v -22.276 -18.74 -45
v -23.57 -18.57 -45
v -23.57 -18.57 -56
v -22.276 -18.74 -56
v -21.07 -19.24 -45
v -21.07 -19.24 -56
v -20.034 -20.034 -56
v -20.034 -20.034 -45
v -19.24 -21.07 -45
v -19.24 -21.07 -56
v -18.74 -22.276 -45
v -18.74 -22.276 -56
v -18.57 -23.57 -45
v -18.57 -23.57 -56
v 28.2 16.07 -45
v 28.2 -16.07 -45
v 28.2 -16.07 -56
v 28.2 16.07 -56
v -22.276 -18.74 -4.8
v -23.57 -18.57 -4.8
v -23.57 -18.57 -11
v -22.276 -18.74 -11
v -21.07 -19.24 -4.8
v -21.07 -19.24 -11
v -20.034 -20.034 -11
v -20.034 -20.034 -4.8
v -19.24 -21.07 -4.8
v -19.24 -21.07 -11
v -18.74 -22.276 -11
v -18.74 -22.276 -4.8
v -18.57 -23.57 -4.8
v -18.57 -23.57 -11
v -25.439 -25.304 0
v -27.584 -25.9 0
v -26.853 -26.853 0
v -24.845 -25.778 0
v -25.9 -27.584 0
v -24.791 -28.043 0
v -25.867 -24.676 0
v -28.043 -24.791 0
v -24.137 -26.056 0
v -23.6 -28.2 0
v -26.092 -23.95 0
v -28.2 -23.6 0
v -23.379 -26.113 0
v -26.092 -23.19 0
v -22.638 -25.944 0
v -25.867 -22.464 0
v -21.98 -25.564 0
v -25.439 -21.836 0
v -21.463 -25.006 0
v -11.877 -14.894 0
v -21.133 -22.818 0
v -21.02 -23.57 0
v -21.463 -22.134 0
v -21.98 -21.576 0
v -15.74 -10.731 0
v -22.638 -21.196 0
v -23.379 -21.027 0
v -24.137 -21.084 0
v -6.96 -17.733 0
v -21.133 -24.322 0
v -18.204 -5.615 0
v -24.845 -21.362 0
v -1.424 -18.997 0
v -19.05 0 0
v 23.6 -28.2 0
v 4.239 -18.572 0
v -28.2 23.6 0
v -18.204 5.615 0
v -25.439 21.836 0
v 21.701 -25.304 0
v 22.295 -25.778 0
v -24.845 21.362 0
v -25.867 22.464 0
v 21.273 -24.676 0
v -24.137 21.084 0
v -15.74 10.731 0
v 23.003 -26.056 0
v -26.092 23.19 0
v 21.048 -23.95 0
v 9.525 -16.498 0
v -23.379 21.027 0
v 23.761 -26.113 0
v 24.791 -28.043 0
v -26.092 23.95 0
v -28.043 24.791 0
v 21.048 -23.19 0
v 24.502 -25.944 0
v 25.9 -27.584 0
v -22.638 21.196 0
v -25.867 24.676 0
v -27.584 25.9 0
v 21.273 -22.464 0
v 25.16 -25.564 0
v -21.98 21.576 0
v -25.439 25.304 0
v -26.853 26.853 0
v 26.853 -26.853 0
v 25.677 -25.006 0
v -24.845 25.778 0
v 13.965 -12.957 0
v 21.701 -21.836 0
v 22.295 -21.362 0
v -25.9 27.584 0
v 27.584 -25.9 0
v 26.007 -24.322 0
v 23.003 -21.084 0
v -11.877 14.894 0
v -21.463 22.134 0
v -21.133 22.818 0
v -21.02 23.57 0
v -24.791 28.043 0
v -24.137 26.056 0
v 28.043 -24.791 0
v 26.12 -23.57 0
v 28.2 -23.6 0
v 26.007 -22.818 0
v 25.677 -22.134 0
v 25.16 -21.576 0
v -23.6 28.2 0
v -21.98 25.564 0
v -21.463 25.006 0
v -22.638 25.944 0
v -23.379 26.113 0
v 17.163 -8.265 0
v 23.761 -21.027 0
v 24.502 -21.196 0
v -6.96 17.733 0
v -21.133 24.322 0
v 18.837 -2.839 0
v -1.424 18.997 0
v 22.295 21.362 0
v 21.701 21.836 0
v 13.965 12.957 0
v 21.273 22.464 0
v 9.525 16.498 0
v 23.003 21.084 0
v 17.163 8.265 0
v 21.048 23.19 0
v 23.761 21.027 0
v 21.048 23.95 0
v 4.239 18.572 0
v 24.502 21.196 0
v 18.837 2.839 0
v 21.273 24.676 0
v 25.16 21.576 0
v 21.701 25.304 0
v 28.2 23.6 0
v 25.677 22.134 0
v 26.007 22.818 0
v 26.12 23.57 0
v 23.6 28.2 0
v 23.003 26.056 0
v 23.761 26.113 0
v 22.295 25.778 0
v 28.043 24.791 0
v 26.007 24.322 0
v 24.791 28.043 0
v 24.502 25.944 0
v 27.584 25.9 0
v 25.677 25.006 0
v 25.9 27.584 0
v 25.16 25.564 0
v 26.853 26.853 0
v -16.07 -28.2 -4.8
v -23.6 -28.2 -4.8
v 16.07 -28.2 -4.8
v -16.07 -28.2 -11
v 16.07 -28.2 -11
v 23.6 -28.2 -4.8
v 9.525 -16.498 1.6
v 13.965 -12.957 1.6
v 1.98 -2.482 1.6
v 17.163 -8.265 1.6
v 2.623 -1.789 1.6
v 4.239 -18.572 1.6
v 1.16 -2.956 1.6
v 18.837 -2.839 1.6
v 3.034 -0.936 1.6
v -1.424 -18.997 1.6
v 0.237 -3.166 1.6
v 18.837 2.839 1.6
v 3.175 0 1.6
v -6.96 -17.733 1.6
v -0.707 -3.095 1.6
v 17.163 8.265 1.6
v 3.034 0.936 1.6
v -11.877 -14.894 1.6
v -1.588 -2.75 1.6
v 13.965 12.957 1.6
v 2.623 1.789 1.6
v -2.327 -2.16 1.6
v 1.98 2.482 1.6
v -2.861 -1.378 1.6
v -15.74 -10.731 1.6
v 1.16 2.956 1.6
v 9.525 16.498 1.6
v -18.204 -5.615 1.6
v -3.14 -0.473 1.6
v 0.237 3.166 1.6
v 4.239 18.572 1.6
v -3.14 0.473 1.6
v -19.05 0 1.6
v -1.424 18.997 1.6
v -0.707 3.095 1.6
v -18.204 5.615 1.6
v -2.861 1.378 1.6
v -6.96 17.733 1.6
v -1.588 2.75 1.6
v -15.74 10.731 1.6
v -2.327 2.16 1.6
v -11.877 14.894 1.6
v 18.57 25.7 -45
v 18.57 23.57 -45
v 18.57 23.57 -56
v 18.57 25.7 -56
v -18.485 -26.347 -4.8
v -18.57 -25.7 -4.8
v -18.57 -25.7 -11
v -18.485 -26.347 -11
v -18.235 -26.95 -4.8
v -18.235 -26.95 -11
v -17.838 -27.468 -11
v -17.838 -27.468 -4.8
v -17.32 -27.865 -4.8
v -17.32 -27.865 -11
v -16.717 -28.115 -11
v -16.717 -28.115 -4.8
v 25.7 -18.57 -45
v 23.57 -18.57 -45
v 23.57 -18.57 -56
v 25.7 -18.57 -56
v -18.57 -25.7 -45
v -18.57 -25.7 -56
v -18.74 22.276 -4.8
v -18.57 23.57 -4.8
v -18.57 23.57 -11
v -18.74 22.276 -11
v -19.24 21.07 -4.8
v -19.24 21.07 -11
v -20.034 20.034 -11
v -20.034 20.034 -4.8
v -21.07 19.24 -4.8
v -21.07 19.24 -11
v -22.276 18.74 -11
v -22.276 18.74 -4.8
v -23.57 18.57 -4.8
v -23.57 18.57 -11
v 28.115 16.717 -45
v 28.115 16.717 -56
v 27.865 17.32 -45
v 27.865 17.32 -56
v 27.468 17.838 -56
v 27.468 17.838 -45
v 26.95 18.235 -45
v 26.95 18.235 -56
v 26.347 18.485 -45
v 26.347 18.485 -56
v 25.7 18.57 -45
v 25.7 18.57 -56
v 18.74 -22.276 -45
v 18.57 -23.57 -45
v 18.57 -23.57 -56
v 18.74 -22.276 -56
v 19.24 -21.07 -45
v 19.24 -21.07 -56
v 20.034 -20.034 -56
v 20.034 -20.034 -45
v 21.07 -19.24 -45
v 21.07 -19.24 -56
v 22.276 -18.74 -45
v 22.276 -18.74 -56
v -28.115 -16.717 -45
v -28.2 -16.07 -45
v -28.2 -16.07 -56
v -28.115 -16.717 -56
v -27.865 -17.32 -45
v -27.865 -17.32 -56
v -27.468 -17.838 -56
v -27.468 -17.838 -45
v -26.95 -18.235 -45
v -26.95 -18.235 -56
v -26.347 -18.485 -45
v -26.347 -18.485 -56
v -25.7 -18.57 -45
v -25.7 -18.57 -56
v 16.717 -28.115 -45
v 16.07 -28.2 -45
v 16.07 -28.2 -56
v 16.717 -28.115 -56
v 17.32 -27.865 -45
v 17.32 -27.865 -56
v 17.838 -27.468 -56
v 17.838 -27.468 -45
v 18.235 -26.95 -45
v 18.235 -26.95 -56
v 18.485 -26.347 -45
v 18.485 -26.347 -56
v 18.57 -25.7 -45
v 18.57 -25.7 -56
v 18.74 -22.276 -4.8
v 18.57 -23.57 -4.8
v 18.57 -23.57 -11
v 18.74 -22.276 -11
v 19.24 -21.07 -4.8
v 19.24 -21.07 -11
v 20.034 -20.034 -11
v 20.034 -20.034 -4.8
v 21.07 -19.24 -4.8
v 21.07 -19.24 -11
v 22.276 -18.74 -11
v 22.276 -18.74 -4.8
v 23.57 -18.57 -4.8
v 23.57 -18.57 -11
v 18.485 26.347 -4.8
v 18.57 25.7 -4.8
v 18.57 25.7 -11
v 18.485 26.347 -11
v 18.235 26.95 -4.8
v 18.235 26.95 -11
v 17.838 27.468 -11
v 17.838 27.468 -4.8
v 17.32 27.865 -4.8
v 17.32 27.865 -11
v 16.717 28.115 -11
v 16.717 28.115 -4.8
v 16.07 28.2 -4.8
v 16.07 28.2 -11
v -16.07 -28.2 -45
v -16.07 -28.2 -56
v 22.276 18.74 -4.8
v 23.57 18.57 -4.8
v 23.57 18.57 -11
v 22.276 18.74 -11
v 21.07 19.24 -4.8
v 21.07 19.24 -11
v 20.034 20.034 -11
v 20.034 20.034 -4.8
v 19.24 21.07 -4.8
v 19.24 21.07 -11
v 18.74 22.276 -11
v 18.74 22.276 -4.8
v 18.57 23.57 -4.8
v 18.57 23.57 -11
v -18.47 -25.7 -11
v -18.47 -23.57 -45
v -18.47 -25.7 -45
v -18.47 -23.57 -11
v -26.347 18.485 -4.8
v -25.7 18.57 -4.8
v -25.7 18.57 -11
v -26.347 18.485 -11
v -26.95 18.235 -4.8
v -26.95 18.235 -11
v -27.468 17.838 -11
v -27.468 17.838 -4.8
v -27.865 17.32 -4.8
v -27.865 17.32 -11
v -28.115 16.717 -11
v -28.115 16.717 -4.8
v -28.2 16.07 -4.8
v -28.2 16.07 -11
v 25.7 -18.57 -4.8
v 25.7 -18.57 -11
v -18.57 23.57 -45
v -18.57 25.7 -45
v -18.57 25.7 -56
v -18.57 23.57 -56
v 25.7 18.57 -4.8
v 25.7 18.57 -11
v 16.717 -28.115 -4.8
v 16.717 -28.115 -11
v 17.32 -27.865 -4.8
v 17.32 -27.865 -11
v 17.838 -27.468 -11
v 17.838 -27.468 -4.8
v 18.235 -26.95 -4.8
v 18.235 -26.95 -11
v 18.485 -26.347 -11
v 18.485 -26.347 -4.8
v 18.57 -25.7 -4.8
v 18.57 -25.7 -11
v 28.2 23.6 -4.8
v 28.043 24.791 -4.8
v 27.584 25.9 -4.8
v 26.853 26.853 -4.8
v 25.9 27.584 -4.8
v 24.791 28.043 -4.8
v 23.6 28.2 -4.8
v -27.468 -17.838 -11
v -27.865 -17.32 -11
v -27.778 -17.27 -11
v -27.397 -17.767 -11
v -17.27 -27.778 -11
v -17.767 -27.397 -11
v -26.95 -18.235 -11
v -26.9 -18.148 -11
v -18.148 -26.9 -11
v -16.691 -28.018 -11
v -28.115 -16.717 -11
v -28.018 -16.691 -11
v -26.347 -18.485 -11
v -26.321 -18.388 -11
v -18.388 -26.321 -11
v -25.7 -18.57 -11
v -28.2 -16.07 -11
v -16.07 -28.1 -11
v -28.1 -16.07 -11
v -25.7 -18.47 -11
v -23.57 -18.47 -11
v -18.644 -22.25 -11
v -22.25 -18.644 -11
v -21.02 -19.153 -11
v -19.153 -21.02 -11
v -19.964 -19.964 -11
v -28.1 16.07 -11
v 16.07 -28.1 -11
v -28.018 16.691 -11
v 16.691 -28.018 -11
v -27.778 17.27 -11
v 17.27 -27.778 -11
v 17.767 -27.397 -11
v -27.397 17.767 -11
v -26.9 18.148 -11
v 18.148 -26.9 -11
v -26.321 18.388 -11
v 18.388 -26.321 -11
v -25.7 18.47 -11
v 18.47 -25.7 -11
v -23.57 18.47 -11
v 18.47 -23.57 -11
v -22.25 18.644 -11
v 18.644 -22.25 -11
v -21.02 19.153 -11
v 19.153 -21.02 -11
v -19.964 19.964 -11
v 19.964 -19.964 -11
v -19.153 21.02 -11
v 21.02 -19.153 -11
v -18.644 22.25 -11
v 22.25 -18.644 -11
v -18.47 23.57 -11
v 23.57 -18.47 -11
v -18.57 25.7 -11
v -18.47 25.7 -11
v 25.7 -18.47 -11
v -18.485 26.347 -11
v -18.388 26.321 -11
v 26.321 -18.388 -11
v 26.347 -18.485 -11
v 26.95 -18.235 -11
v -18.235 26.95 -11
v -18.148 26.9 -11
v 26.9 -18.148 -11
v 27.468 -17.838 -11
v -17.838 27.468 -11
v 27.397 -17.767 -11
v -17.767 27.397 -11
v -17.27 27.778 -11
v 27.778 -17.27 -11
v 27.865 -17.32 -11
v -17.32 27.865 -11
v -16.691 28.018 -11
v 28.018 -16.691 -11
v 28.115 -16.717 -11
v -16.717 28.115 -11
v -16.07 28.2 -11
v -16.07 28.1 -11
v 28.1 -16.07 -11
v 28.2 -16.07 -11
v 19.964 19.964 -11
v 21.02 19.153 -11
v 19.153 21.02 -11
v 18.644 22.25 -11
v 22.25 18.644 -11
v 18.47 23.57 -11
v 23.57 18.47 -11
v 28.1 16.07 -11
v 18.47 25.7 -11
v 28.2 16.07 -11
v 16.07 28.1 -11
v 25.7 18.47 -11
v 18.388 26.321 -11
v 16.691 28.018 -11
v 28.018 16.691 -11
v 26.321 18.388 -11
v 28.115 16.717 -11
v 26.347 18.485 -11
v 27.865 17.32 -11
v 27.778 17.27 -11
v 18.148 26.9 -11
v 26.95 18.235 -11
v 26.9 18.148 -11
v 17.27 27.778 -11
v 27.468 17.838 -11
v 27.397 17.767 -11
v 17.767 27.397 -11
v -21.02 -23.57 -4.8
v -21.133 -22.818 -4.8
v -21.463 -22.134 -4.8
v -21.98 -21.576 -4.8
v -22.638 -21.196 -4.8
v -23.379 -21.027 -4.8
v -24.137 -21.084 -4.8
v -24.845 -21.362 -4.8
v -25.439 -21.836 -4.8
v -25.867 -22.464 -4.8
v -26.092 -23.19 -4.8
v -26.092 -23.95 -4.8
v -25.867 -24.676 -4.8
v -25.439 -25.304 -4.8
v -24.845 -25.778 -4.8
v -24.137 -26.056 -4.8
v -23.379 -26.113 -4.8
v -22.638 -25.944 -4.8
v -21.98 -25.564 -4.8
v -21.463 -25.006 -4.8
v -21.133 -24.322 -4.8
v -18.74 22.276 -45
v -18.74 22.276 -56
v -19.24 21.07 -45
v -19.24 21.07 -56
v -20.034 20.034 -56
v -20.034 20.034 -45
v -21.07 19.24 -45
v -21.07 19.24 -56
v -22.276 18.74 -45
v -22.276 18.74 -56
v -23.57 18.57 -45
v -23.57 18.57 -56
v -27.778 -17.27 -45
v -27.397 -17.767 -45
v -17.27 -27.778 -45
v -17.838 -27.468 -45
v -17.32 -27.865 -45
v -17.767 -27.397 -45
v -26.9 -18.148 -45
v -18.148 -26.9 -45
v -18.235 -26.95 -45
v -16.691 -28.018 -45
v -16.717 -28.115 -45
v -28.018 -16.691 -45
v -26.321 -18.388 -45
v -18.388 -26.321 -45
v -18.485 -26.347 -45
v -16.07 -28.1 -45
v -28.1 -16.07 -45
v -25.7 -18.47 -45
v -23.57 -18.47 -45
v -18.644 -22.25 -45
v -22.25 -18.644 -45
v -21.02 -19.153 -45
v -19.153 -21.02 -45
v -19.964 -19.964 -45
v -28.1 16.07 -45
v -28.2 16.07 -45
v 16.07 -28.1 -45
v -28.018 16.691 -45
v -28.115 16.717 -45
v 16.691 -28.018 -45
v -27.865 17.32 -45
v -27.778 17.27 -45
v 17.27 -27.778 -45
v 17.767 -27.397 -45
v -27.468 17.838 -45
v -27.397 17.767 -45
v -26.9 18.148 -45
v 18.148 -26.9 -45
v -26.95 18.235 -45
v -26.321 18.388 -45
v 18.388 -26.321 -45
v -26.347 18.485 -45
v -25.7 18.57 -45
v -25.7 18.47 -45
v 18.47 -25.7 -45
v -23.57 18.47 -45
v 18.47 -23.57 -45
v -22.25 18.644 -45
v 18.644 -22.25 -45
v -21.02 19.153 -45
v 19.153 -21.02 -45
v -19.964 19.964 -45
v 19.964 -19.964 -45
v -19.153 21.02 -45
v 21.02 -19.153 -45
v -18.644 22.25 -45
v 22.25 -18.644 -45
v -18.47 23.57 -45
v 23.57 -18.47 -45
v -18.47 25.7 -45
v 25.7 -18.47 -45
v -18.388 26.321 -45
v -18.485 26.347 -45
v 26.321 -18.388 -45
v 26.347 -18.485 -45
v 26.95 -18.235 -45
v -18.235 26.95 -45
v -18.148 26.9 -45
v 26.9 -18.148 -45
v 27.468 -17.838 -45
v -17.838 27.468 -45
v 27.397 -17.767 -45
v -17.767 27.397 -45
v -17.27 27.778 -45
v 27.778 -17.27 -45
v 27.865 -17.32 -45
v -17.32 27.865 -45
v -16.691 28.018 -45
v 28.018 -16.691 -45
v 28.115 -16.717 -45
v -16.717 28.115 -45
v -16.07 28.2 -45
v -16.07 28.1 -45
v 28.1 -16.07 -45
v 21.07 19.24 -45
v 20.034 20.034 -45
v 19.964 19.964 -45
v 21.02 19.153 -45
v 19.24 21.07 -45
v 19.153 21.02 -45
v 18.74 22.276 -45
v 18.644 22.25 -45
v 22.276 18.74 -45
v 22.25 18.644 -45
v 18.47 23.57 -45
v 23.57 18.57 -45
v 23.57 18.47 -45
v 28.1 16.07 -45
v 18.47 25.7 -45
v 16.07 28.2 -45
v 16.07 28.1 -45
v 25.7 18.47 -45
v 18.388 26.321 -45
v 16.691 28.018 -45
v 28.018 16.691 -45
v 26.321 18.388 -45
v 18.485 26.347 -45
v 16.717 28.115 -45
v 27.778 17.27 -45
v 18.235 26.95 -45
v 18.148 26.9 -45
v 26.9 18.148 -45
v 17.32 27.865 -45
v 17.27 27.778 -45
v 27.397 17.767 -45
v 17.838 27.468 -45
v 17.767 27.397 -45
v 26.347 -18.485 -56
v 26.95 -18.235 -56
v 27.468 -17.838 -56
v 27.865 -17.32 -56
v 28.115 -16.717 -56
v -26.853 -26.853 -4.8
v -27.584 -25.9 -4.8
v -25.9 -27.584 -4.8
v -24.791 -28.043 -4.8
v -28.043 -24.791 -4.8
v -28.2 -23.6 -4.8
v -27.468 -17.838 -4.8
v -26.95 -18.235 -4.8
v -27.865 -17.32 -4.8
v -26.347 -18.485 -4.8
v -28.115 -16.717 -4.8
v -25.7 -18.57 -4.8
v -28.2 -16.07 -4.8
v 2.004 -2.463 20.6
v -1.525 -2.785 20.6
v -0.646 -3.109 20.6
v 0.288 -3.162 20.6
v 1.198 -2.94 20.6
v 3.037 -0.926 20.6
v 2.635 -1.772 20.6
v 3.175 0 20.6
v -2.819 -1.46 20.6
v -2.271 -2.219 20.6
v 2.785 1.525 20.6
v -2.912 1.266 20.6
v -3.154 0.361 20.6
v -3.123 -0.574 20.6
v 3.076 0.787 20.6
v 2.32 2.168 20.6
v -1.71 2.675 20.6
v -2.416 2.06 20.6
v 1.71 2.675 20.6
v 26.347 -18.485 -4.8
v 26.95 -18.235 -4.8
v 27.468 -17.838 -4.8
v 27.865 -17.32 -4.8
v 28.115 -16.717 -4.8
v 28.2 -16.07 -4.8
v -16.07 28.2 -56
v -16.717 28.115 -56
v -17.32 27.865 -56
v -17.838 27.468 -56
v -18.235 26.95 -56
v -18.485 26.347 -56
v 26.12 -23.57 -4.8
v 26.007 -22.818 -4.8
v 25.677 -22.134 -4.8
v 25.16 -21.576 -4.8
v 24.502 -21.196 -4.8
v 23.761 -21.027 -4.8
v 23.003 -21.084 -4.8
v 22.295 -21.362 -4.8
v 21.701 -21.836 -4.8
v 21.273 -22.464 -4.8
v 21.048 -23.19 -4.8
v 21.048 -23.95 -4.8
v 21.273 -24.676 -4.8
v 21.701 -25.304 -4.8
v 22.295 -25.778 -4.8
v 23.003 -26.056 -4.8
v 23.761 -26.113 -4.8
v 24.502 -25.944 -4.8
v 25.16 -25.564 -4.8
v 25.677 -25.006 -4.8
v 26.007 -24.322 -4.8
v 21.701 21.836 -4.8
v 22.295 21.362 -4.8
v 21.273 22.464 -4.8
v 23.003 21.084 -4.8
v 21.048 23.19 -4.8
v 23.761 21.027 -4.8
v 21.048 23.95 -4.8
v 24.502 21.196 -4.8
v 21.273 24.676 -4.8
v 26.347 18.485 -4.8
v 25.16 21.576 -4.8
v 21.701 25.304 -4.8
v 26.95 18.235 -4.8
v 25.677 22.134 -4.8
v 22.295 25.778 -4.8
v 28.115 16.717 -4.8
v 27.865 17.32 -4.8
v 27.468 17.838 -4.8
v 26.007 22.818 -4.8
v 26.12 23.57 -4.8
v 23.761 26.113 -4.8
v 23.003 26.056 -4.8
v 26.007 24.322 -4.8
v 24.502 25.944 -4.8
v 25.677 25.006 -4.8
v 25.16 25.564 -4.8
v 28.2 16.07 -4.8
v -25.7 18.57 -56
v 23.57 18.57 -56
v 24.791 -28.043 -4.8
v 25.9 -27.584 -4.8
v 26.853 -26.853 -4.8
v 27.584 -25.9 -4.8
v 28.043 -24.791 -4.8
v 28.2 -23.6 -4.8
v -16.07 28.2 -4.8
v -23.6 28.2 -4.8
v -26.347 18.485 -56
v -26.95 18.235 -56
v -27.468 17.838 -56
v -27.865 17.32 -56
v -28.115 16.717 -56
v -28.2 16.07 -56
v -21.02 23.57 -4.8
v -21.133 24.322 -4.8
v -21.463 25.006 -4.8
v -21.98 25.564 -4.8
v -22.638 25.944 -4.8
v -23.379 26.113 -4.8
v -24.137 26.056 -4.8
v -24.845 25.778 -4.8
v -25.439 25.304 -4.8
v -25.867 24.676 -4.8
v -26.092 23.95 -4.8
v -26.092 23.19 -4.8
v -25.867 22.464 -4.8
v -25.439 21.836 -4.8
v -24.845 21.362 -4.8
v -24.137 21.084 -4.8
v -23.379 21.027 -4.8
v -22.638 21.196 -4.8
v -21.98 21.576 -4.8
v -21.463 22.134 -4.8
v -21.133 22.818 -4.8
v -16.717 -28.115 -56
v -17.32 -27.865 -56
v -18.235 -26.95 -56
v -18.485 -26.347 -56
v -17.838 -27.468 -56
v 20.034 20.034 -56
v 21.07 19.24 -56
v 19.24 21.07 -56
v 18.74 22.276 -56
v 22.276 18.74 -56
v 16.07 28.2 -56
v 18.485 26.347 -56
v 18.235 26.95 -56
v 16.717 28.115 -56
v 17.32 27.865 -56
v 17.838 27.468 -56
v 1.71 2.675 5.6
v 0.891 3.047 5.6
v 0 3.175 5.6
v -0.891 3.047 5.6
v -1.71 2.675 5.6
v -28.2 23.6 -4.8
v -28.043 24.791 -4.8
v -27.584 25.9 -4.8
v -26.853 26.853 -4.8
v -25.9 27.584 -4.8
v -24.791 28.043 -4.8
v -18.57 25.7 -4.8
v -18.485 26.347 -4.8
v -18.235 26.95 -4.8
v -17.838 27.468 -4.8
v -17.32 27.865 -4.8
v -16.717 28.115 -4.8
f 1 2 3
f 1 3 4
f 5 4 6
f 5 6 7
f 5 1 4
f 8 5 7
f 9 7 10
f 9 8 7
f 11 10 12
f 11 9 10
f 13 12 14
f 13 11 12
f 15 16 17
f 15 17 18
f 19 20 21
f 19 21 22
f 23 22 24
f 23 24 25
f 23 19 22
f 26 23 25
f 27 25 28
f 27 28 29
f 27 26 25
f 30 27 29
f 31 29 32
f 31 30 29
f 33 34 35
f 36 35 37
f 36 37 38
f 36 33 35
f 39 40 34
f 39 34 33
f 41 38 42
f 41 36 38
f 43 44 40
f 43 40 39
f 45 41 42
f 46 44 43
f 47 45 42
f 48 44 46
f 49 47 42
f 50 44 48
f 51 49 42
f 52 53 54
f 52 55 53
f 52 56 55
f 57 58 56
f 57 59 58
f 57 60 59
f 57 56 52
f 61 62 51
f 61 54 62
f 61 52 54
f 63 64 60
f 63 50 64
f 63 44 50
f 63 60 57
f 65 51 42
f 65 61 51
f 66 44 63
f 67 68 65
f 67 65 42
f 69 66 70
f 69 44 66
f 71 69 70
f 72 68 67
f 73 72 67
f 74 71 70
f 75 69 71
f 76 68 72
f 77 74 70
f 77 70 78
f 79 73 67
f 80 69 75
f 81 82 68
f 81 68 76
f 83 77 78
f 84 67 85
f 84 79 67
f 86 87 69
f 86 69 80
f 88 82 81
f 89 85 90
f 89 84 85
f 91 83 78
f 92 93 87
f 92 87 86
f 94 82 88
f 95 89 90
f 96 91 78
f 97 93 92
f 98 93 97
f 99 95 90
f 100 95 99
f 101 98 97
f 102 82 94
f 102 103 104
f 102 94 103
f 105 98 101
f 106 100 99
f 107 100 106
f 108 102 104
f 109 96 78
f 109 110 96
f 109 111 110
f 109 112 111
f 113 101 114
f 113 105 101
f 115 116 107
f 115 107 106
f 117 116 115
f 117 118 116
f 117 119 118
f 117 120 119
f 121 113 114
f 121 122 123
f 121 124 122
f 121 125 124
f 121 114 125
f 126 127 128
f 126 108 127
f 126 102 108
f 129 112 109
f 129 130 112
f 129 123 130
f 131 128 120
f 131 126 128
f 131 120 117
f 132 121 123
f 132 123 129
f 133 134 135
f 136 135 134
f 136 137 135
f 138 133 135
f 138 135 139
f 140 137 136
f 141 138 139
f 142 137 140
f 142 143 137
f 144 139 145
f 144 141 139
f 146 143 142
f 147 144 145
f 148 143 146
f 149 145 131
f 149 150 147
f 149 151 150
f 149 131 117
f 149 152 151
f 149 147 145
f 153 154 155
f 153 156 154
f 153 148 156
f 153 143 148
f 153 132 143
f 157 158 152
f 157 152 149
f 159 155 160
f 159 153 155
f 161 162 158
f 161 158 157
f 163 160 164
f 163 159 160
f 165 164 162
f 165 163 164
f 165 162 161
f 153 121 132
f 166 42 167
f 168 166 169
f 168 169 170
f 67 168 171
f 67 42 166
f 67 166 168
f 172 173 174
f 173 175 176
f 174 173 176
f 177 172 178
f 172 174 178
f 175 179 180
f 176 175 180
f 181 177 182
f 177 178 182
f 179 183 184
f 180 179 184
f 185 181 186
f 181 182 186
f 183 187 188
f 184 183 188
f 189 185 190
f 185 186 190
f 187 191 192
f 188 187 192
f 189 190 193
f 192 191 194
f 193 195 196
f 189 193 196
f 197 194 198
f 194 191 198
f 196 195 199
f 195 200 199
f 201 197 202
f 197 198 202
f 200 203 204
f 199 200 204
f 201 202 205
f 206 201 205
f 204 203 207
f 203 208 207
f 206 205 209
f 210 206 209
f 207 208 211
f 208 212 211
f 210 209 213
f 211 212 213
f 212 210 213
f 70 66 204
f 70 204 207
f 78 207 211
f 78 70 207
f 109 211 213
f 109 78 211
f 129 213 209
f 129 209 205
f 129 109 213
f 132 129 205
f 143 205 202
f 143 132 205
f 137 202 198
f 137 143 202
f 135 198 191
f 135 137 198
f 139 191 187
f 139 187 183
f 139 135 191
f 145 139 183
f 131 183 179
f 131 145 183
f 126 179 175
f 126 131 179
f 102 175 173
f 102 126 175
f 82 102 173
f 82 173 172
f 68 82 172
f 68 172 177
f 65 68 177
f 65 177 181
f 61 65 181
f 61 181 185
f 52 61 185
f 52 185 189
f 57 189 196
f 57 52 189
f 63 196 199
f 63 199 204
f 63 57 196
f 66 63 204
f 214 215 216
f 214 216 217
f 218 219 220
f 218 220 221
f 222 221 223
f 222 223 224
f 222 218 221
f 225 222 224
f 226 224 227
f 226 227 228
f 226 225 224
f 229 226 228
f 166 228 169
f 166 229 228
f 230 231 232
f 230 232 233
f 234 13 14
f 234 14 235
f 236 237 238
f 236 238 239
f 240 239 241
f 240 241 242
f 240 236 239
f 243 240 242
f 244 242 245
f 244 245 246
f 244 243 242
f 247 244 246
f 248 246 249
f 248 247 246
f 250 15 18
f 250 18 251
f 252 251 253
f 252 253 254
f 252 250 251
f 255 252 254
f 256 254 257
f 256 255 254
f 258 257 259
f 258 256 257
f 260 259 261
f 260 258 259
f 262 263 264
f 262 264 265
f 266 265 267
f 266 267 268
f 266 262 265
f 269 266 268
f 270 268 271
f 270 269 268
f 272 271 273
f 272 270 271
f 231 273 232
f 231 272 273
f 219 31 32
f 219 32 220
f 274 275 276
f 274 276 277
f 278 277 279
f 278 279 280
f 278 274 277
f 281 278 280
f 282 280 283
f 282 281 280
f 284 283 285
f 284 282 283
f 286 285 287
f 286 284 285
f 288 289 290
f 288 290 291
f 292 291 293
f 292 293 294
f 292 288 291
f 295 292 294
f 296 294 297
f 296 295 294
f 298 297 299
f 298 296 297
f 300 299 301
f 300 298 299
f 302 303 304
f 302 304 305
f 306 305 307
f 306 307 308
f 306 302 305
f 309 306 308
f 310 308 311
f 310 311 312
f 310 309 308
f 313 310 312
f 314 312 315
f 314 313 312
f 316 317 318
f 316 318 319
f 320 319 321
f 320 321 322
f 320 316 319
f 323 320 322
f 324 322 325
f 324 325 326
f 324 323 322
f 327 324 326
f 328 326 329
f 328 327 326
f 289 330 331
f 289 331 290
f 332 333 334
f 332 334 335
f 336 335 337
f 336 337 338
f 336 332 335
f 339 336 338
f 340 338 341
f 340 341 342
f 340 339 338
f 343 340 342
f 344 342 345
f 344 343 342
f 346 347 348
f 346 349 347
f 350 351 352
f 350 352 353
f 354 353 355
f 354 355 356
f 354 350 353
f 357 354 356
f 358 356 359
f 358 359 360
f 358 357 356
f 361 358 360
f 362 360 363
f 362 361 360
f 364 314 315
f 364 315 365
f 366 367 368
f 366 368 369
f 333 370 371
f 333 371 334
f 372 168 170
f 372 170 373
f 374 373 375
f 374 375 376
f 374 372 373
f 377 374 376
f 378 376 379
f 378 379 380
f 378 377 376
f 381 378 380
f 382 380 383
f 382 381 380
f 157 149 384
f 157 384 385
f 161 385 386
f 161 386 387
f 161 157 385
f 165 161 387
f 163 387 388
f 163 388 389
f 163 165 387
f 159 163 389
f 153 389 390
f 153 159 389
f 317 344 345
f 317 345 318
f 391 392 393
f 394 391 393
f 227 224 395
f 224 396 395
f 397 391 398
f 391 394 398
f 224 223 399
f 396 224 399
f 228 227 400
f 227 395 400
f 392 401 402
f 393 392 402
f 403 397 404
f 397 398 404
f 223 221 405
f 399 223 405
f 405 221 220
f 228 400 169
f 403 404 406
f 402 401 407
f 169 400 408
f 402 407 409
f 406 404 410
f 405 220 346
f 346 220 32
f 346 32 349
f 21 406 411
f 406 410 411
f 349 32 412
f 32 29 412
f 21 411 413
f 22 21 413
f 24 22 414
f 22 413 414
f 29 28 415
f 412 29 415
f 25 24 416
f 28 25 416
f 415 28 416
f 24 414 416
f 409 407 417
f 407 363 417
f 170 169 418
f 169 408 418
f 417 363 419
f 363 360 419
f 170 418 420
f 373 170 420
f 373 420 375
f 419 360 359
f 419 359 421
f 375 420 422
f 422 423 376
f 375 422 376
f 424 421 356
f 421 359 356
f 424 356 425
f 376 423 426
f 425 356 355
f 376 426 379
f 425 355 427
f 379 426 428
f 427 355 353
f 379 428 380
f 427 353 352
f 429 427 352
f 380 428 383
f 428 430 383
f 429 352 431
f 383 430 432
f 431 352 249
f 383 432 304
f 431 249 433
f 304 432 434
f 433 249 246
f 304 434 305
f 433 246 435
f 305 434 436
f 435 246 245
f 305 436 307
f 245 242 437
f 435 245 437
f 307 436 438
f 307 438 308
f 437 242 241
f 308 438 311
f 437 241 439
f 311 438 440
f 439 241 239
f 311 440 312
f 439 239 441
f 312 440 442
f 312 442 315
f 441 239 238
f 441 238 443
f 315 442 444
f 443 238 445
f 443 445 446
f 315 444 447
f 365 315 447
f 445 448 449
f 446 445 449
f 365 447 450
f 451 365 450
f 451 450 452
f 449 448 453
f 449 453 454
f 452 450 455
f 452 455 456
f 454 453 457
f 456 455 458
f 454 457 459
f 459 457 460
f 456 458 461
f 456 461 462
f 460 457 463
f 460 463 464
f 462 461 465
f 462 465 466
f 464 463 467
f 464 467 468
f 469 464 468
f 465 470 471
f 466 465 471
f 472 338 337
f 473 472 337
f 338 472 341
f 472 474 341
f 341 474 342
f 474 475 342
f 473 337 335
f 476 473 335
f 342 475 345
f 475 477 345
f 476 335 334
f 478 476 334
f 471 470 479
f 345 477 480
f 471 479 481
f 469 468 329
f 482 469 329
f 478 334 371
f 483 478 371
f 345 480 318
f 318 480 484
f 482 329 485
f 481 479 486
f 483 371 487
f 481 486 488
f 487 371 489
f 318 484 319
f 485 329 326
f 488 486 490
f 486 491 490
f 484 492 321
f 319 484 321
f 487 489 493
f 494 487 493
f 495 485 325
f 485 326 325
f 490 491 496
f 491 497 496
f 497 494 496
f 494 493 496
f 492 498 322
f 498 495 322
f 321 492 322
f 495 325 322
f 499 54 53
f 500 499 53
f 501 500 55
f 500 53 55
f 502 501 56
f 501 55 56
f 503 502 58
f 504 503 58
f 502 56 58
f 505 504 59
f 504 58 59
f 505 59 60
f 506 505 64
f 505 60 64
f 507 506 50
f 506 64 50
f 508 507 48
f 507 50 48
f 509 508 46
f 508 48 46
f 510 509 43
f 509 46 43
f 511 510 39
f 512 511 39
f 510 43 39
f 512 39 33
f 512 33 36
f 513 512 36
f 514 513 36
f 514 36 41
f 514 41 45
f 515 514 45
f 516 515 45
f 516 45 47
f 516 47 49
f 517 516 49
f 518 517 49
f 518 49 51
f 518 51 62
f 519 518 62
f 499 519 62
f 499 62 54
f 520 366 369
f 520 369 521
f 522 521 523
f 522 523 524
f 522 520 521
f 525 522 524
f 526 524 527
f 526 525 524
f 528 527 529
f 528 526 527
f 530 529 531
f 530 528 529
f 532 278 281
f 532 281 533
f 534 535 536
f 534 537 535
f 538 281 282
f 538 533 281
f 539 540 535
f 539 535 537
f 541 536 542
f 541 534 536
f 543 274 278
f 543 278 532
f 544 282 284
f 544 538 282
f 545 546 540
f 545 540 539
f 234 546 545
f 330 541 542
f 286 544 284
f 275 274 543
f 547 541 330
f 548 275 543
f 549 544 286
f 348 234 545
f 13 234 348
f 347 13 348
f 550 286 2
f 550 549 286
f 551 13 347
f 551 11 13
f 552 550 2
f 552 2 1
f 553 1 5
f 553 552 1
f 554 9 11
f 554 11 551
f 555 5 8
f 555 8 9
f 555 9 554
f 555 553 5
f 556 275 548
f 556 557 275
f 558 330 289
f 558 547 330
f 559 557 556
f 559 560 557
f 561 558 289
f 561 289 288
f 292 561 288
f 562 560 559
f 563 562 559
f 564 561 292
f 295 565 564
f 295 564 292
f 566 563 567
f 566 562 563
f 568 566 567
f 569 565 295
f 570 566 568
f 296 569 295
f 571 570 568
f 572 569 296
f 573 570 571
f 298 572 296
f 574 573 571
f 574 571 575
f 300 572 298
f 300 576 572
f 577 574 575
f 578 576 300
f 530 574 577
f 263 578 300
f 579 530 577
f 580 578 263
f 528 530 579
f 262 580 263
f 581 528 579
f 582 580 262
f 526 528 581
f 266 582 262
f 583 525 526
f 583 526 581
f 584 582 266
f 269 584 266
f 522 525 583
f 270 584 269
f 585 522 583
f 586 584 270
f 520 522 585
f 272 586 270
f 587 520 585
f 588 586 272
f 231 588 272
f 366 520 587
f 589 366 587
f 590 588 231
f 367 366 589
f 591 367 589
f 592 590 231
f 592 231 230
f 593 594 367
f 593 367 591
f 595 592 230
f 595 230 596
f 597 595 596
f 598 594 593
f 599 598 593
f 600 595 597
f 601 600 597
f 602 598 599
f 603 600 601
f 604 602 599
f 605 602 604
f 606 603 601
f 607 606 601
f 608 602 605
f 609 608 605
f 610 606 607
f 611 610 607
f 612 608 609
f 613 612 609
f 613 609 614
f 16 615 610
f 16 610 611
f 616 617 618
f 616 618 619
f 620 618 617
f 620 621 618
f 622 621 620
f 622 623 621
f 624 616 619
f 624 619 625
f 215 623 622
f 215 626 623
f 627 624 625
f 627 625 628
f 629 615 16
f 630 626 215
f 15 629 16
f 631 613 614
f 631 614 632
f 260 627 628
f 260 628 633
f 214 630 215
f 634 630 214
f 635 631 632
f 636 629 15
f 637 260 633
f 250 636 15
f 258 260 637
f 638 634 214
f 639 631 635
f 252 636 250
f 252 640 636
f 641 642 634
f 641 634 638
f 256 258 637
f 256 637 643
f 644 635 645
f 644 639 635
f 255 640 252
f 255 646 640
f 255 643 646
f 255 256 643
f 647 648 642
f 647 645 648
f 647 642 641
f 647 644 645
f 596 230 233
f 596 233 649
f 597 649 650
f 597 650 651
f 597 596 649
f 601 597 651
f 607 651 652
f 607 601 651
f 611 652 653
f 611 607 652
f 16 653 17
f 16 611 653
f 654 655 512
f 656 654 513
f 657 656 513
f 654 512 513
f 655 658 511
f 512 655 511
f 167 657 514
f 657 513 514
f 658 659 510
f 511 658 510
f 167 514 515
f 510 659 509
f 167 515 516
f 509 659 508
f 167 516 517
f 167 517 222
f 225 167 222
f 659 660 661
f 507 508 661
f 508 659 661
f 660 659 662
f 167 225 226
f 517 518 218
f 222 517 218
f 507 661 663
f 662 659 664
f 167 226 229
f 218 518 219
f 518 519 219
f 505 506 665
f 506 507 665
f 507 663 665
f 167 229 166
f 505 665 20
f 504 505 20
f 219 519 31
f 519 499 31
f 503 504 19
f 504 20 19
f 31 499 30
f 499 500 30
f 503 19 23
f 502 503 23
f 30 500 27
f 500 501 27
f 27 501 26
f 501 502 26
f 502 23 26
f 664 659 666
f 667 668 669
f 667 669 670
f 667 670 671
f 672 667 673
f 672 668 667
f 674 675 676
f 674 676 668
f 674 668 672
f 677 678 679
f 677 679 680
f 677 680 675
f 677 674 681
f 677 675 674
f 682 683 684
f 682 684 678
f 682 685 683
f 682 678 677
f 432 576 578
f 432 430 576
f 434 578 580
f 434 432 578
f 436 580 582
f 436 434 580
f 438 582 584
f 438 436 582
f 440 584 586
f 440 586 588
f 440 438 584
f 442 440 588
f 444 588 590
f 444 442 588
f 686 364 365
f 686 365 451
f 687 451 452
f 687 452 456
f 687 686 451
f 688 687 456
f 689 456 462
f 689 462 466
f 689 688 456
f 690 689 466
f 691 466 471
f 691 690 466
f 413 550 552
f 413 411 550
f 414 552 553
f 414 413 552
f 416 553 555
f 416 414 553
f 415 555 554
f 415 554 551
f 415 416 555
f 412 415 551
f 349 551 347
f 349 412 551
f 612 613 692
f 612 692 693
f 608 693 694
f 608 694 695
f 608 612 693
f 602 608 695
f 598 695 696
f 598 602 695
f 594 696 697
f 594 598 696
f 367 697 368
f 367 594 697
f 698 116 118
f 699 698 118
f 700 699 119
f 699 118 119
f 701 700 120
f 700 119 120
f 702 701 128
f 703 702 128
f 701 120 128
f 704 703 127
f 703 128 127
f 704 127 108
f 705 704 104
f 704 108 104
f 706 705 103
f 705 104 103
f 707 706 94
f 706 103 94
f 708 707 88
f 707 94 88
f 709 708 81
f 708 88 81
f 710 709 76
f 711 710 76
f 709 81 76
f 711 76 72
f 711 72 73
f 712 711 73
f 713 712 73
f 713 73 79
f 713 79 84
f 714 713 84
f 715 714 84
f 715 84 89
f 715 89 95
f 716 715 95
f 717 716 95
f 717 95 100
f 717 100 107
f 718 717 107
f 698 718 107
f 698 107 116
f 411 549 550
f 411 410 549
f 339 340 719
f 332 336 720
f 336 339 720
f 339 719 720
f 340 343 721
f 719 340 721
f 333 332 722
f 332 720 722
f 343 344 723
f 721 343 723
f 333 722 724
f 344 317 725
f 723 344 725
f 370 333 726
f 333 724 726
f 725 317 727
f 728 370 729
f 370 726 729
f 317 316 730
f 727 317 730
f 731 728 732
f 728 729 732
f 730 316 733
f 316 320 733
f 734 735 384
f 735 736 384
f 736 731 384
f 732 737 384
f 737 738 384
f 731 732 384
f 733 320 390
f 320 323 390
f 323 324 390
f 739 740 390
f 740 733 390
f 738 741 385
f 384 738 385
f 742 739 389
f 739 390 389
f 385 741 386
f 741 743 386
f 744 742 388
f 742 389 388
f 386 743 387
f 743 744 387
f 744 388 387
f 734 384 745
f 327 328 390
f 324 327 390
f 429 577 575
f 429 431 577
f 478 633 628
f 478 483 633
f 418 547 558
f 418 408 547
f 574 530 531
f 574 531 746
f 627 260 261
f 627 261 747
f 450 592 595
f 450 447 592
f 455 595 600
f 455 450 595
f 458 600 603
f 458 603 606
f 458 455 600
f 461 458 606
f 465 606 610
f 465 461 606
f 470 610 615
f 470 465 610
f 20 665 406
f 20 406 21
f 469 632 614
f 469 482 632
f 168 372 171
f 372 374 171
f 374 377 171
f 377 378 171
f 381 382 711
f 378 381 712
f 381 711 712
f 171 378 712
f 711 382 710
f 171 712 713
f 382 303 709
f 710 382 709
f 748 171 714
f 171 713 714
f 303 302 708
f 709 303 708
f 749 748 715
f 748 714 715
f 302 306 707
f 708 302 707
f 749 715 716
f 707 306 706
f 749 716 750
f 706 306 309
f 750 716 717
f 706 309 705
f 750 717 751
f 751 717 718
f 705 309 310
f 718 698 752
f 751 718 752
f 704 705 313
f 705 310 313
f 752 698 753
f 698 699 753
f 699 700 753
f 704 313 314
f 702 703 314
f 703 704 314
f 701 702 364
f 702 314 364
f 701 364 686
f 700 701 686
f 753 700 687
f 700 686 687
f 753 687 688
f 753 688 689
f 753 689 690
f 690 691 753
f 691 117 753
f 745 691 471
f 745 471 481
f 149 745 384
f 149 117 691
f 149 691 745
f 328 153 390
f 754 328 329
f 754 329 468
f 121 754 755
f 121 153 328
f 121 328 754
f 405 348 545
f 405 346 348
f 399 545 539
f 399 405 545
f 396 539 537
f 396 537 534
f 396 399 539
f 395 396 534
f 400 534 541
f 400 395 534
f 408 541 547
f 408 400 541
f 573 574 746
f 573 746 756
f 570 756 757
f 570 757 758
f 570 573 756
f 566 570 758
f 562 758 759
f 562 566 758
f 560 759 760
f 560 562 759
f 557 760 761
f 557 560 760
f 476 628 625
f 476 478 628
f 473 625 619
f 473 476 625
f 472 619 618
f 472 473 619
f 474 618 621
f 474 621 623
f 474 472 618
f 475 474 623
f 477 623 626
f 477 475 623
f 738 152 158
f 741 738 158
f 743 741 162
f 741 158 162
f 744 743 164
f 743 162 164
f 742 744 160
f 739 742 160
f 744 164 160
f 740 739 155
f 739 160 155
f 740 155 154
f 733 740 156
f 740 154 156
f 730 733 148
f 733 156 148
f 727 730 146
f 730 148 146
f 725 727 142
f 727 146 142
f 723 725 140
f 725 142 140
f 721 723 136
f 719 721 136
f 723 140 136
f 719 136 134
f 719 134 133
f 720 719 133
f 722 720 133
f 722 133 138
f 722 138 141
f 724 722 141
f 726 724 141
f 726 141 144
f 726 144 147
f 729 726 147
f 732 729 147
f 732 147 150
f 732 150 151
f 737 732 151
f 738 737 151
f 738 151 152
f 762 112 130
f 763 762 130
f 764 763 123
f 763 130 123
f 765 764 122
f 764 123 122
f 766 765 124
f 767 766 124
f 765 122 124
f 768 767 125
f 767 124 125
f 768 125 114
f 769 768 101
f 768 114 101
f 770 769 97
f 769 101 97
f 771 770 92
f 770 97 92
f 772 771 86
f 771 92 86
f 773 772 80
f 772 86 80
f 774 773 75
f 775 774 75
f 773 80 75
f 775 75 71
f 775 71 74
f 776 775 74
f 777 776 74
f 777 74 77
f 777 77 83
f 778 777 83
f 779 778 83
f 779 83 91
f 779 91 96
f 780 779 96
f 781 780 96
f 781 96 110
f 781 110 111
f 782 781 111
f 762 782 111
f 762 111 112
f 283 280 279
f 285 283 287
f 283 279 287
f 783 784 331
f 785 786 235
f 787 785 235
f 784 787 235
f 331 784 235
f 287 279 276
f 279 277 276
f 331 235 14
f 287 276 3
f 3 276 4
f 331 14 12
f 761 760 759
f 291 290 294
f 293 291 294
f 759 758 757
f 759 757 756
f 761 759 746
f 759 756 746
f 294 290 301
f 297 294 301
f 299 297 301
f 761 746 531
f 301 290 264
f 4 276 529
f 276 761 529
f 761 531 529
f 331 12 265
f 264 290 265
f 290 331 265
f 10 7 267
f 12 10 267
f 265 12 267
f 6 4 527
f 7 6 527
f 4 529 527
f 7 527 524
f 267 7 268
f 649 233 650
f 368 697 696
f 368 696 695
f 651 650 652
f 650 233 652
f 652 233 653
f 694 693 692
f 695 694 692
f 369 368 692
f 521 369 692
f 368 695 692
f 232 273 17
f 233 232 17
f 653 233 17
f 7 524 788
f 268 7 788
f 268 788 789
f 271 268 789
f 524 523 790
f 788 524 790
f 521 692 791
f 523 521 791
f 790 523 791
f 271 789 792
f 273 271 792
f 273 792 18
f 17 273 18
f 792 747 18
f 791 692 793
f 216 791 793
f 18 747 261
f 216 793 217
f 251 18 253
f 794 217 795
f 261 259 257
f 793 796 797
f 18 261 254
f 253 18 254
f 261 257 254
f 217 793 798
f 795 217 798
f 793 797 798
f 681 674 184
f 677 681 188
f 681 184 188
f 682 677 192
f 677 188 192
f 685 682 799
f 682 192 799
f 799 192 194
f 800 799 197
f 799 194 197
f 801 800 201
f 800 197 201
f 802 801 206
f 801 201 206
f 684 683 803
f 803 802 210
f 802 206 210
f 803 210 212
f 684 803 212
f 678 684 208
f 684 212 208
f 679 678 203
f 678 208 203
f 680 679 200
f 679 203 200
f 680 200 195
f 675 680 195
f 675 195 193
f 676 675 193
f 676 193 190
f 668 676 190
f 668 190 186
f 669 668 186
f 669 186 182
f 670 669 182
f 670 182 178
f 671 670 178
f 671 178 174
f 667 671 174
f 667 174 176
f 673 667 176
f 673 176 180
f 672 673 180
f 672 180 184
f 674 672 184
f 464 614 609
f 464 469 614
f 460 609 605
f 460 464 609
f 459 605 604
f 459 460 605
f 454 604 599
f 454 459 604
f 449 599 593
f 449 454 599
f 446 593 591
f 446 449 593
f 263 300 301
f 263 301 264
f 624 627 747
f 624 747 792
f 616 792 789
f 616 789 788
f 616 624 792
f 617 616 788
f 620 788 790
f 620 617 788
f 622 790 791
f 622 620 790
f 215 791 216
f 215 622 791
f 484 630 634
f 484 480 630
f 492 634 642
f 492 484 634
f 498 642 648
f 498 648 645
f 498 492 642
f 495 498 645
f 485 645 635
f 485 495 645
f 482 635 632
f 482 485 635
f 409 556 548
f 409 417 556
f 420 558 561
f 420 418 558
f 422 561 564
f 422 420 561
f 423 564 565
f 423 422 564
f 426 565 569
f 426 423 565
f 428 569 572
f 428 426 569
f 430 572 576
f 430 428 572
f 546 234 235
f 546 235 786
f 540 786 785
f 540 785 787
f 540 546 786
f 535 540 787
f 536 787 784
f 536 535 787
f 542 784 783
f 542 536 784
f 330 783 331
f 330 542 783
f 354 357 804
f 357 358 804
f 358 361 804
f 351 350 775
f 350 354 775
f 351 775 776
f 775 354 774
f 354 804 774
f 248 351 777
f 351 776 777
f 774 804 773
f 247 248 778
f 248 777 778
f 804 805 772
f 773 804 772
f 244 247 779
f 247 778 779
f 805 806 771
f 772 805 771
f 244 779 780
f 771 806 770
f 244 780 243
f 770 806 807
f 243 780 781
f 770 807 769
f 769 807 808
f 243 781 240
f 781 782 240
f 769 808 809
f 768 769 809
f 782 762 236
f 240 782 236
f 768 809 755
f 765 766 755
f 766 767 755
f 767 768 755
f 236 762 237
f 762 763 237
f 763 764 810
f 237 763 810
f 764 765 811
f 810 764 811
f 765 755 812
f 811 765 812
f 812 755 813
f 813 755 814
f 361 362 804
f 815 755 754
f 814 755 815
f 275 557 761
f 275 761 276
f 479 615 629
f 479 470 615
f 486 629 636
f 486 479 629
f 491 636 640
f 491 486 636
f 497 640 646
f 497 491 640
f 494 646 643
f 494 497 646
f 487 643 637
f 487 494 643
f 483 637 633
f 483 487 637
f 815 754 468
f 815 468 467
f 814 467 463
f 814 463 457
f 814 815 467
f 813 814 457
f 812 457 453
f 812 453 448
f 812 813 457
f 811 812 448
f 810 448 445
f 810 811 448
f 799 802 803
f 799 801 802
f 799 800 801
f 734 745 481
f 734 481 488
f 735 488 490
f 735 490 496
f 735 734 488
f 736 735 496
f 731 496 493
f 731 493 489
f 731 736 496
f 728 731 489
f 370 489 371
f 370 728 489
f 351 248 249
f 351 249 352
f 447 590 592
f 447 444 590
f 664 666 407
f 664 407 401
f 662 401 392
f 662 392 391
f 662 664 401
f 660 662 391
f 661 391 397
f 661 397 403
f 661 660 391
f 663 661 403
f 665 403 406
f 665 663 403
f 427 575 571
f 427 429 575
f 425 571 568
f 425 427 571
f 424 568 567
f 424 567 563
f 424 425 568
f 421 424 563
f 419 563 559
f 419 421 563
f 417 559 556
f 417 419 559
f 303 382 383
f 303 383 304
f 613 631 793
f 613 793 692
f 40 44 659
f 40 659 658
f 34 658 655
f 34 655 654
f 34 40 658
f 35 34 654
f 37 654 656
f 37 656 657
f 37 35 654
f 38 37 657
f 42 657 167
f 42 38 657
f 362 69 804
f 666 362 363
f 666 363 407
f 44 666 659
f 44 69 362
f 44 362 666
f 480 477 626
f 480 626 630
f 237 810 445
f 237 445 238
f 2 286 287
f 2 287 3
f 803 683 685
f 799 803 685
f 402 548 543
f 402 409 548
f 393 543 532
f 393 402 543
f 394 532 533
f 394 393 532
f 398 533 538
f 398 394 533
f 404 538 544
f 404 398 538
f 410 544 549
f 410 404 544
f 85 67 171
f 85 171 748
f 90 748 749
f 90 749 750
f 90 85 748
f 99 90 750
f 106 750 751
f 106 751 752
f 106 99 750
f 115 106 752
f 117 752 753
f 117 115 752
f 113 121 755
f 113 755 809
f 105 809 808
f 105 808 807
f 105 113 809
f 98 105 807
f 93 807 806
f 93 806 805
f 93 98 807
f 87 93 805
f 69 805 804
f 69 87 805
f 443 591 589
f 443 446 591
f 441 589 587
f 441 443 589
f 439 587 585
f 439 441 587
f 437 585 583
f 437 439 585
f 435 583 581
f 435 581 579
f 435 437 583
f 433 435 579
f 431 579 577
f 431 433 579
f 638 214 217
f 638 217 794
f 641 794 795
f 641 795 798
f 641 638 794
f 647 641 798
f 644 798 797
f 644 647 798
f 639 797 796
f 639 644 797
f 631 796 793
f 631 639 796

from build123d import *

# Parameters (mm, degrees)
SKETCH1_R           = 3.175
BOSS_EXTRUDE1_DEPTH = 20.6
SKETCH2_R           = 19.05
BOSS_EXTRUDE2_DEPTH = 1.6
BOSS_EXTRUDE3_DEPTH = 4.8
BOSS_EXTRUDE4_DEPTH = 51.2
SKETCH7_W           = 3.420526276
SKETCH7_H           = 1.112659396
CUT_EXTRUDE5_DEPTH  = 15
CUT_EXTRUDE6_REACH  = 58
SKETCH8_R           = 2.55
CUT_EXTRUDE7_DEPTH  = 17


with BuildPart() as part:
    # Sketch1 → Boss-Extrude1 (new body)
    with BuildSketch(Plane.XY):
        Circle(SKETCH1_R)
    extrude(amount=BOSS_EXTRUDE1_DEPTH)

    # Sketch2 → Boss-Extrude2 (add)
    with BuildSketch(Plane(origin=(0, 0, 0), x_dir=(-1, 0, 0), z_dir=(0, 0, -1))):
        Circle(SKETCH2_R)
    extrude(amount=-BOSS_EXTRUDE2_DEPTH)

    # Sketch3 → Boss-Extrude3 (add)
    with BuildSketch(Plane(origin=(0, 0, 0), x_dir=(-1, 0, 0), z_dir=(0, 0, -1))):
        with BuildLine():
            Line((23.6, -28.2), (-23.6, -28.2))
            ThreePointArc((-23.6, -28.2), (-26.852691193, -26.852691193), (-28.2, -23.6))
            Line((-28.2, -23.6), (-28.2, 23.6))
            ThreePointArc((-28.2, 23.6), (-26.852691193, 26.852691193), (-23.6, 28.2))
            Line((-23.6, 28.2), (23.6, 28.2))
            ThreePointArc((23.6, 28.2), (26.852691193, 26.852691193), (28.2, 23.6))
            Line((28.2, 23.6), (28.2, -23.6))
            ThreePointArc((28.2, -23.6), (26.852691193, -26.852691193), (23.6, -28.2))
        make_face()
    extrude(amount=BOSS_EXTRUDE3_DEPTH)

    # Sketch4 → Boss-Extrude4 (add)
    with BuildSketch(Plane(origin=(0, 0, -4.8), x_dir=(-1, 0, 0), z_dir=(0, 0, -1))):
        with BuildLine():
            Line((-18.57, 23.57), (-18.57, 25.7))
            ThreePointArc((-18.57, 25.7), (-17.837766953, 27.467766953), (-16.07, 28.2))
            Line((-16.07, 28.2), (16.07, 28.2))
            ThreePointArc((16.07, 28.2), (17.837766953, 27.467766953), (18.57, 25.7))
            Line((18.57, 25.7), (18.57, 23.57))
            ThreePointArc((18.57, 23.57), (20.034466094, 20.034466094), (23.57, 18.57))
            Line((23.57, 18.57), (25.7, 18.57))
            ThreePointArc((25.7, 18.57), (27.467766953, 17.837766953), (28.2, 16.07))
            Line((28.2, 16.07), (28.2, -16.07))
            ThreePointArc((28.2, -16.07), (27.467766953, -17.837766953), (25.7, -18.57))
            Line((25.7, -18.57), (23.57, -18.57))
            ThreePointArc((23.57, -18.57), (20.034466094, -20.034466094), (18.57, -23.57))
            Line((18.57, -23.57), (18.57, -25.7))
            ThreePointArc((18.57, -25.7), (17.837766953, -27.467766953), (16.07, -28.2))
            Line((16.07, -28.2), (-16.07, -28.2))
            ThreePointArc((-16.07, -28.2), (-17.837766953, -27.467766953), (-18.57, -25.7))
            Line((-18.57, -25.7), (-18.57, -23.57))
            ThreePointArc((-18.57, -23.57), (-20.034466094, -20.034466094), (-23.57, -18.57))
            Line((-23.57, -18.57), (-25.7, -18.57))
            ThreePointArc((-25.7, -18.57), (-27.467766953, -17.837766953), (-28.2, -16.07))
            Line((-28.2, -16.07), (-28.2, 16.07))
            ThreePointArc((-28.2, 16.07), (-27.467766953, 17.837766953), (-25.7, 18.57))
            Line((-25.7, 18.57), (-23.57, 18.57))
            ThreePointArc((-23.57, 18.57), (-20.034466094, 20.034466094), (-18.57, 23.57))
        make_face()
    extrude(amount=BOSS_EXTRUDE4_DEPTH)

    # Sketch7 → Cut-Extrude5 (cut)
    with BuildSketch(Plane.XY.offset(20.6)):
        with Locations((0, 3.231329698)):
            Rectangle(SKETCH7_W, SKETCH7_H)
    extrude(amount=-CUT_EXTRUDE5_DEPTH, mode=Mode.SUBTRACT)

    # Sketch8 → Cut-Extrude6 (cut, up to next)
    with BuildSketch(Plane.XY, mode=Mode.PRIVATE) as cut_extrude6_sk1:
        with Locations((-23.57, 23.57)):
            Circle(SKETCH8_R)
    cut_extrude6_tool1 = extrude(cut_extrude6_sk1.sketch, amount=-CUT_EXTRUDE6_REACH, mode=Mode.PRIVATE) & part.part
    add(cut_extrude6_tool1.solids().sort_by_distance((-23.57, 23.57, 0))[0], mode=Mode.SUBTRACT)
    # Sketch8 → Cut-Extrude6 (cut, up to next)
    with BuildSketch(Plane.XY, mode=Mode.PRIVATE) as cut_extrude6_sk2:
        with Locations((23.57, 23.57)):
            Circle(SKETCH8_R)
    cut_extrude6_tool2 = extrude(cut_extrude6_sk2.sketch, amount=-CUT_EXTRUDE6_REACH, mode=Mode.PRIVATE) & part.part
    add(cut_extrude6_tool2.solids().sort_by_distance((23.57, 23.57, 0))[0], mode=Mode.SUBTRACT)
    # Sketch8 → Cut-Extrude6 (cut, up to next)
    with BuildSketch(Plane.XY, mode=Mode.PRIVATE) as cut_extrude6_sk3:
        with Locations((23.57, -23.57)):
            Circle(SKETCH8_R)
    cut_extrude6_tool3 = extrude(cut_extrude6_sk3.sketch, amount=-CUT_EXTRUDE6_REACH, mode=Mode.PRIVATE) & part.part
    add(cut_extrude6_tool3.solids().sort_by_distance((23.57, -23.57, 0))[0], mode=Mode.SUBTRACT)
    # Sketch8 → Cut-Extrude6 (cut, up to next)
    with BuildSketch(Plane.XY, mode=Mode.PRIVATE) as cut_extrude6_sk4:
        with Locations((-23.57, -23.57)):
            Circle(SKETCH8_R)
    cut_extrude6_tool4 = extrude(cut_extrude6_sk4.sketch, amount=-CUT_EXTRUDE6_REACH, mode=Mode.PRIVATE) & part.part
    add(cut_extrude6_tool4.solids().sort_by_distance((-23.57, -23.57, 0))[0], mode=Mode.SUBTRACT)

    # Sketch9 → Cut-Extrude7 (cut, symmetric)
    with BuildSketch(Plane.XY.offset(-28)):
        with BuildLine():
            Line((18.57, 23.57), (18.57, 25.7))
            ThreePointArc((18.57, 25.7), (17.837766953, 27.467766953), (16.07, 28.2))
            Line((16.07, 28.2), (-16.07, 28.2))
            ThreePointArc((-16.07, 28.2), (-17.837766953, 27.467766953), (-18.57, 25.7))
            Line((-18.57, 25.7), (-18.57, 23.57))
            ThreePointArc((-18.57, 23.57), (-20.034466094, 20.034466094), (-23.57, 18.57))
            Line((-23.57, 18.57), (-25.7, 18.57))
            ThreePointArc((-25.7, 18.57), (-27.467766953, 17.837766953), (-28.2, 16.07))
            Line((-28.2, 16.07), (-28.2, -16.07))
            ThreePointArc((-28.2, -16.07), (-27.467766953, -17.837766953), (-25.7, -18.57))
            Line((-25.7, -18.57), (-23.57, -18.57))
            ThreePointArc((-23.57, -18.57), (-20.034466094, -20.034466094), (-18.57, -23.57))
            Line((-18.57, -23.57), (-18.57, -25.7))
            ThreePointArc((-18.57, -25.7), (-17.837766953, -27.467766953), (-16.07, -28.2))
            Line((-16.07, -28.2), (16.07, -28.2))
            ThreePointArc((16.07, -28.2), (17.837766953, -27.467766953), (18.57, -25.7))
            Line((18.57, -25.7), (18.57, -23.57))
            ThreePointArc((18.57, -23.57), (20.034466094, -20.034466094), (23.57, -18.57))
            Line((23.57, -18.57), (25.7, -18.57))
            ThreePointArc((25.7, -18.57), (27.467766953, -17.837766953), (28.2, -16.07))
            Line((28.2, -16.07), (28.2, 16.07))
            ThreePointArc((28.2, 16.07), (27.467766953, 17.837766953), (25.7, 18.57))
            Line((25.7, 18.57), (23.57, 18.57))
            ThreePointArc((23.57, 18.57), (20.034466094, 20.034466094), (18.57, 23.57))
        make_face()
        with BuildLine():
            Line((18.47, 23.57), (18.47, 25.7))
            ThreePointArc((18.47, 25.7), (17.767056275, 27.397056275), (16.07, 28.1))
            Line((16.07, 28.1), (-16.07, 28.1))
            ThreePointArc((-16.07, 28.1), (-17.767056275, 27.397056275), (-18.47, 25.7))
            Line((-18.47, 25.7), (-18.47, 23.57))
            ThreePointArc((-18.47, 23.57), (-19.963755416, 19.963755416), (-23.57, 18.47))
            Line((-23.57, 18.47), (-25.7, 18.47))
            ThreePointArc((-25.7, 18.47), (-27.397056275, 17.767056275), (-28.1, 16.07))
            Line((-28.1, 16.07), (-28.1, -16.07))
            ThreePointArc((-28.1, -16.07), (-27.397056275, -17.767056275), (-25.7, -18.47))
            Line((-25.7, -18.47), (-23.57, -18.47))
            ThreePointArc((-23.57, -18.47), (-19.963755416, -19.963755416), (-18.47, -23.57))
            Line((-18.47, -23.57), (-18.47, -25.7))
            ThreePointArc((-18.47, -25.7), (-17.767056275, -27.397056275), (-16.07, -28.1))
            Line((-16.07, -28.1), (16.07, -28.1))
            ThreePointArc((16.07, -28.1), (17.767056275, -27.397056275), (18.47, -25.7))
            Line((18.47, -25.7), (18.47, -23.57))
            ThreePointArc((18.47, -23.57), (19.963755416, -19.963755416), (23.57, -18.47))
            Line((23.57, -18.47), (25.7, -18.47))
            ThreePointArc((25.7, -18.47), (27.397056275, -17.767056275), (28.1, -16.07))
            Line((28.1, -16.07), (28.1, 16.07))
            ThreePointArc((28.1, 16.07), (27.397056275, 17.767056275), (25.7, 18.47))
            Line((25.7, 18.47), (23.57, 18.47))
            ThreePointArc((23.57, 18.47), (19.963755416, 19.963755416), (18.47, 23.57))
        make_face(mode=Mode.SUBTRACT)
    extrude(amount=CUT_EXTRUDE7_DEPTH, both=True, mode=Mode.SUBTRACT)


solid = part.part
